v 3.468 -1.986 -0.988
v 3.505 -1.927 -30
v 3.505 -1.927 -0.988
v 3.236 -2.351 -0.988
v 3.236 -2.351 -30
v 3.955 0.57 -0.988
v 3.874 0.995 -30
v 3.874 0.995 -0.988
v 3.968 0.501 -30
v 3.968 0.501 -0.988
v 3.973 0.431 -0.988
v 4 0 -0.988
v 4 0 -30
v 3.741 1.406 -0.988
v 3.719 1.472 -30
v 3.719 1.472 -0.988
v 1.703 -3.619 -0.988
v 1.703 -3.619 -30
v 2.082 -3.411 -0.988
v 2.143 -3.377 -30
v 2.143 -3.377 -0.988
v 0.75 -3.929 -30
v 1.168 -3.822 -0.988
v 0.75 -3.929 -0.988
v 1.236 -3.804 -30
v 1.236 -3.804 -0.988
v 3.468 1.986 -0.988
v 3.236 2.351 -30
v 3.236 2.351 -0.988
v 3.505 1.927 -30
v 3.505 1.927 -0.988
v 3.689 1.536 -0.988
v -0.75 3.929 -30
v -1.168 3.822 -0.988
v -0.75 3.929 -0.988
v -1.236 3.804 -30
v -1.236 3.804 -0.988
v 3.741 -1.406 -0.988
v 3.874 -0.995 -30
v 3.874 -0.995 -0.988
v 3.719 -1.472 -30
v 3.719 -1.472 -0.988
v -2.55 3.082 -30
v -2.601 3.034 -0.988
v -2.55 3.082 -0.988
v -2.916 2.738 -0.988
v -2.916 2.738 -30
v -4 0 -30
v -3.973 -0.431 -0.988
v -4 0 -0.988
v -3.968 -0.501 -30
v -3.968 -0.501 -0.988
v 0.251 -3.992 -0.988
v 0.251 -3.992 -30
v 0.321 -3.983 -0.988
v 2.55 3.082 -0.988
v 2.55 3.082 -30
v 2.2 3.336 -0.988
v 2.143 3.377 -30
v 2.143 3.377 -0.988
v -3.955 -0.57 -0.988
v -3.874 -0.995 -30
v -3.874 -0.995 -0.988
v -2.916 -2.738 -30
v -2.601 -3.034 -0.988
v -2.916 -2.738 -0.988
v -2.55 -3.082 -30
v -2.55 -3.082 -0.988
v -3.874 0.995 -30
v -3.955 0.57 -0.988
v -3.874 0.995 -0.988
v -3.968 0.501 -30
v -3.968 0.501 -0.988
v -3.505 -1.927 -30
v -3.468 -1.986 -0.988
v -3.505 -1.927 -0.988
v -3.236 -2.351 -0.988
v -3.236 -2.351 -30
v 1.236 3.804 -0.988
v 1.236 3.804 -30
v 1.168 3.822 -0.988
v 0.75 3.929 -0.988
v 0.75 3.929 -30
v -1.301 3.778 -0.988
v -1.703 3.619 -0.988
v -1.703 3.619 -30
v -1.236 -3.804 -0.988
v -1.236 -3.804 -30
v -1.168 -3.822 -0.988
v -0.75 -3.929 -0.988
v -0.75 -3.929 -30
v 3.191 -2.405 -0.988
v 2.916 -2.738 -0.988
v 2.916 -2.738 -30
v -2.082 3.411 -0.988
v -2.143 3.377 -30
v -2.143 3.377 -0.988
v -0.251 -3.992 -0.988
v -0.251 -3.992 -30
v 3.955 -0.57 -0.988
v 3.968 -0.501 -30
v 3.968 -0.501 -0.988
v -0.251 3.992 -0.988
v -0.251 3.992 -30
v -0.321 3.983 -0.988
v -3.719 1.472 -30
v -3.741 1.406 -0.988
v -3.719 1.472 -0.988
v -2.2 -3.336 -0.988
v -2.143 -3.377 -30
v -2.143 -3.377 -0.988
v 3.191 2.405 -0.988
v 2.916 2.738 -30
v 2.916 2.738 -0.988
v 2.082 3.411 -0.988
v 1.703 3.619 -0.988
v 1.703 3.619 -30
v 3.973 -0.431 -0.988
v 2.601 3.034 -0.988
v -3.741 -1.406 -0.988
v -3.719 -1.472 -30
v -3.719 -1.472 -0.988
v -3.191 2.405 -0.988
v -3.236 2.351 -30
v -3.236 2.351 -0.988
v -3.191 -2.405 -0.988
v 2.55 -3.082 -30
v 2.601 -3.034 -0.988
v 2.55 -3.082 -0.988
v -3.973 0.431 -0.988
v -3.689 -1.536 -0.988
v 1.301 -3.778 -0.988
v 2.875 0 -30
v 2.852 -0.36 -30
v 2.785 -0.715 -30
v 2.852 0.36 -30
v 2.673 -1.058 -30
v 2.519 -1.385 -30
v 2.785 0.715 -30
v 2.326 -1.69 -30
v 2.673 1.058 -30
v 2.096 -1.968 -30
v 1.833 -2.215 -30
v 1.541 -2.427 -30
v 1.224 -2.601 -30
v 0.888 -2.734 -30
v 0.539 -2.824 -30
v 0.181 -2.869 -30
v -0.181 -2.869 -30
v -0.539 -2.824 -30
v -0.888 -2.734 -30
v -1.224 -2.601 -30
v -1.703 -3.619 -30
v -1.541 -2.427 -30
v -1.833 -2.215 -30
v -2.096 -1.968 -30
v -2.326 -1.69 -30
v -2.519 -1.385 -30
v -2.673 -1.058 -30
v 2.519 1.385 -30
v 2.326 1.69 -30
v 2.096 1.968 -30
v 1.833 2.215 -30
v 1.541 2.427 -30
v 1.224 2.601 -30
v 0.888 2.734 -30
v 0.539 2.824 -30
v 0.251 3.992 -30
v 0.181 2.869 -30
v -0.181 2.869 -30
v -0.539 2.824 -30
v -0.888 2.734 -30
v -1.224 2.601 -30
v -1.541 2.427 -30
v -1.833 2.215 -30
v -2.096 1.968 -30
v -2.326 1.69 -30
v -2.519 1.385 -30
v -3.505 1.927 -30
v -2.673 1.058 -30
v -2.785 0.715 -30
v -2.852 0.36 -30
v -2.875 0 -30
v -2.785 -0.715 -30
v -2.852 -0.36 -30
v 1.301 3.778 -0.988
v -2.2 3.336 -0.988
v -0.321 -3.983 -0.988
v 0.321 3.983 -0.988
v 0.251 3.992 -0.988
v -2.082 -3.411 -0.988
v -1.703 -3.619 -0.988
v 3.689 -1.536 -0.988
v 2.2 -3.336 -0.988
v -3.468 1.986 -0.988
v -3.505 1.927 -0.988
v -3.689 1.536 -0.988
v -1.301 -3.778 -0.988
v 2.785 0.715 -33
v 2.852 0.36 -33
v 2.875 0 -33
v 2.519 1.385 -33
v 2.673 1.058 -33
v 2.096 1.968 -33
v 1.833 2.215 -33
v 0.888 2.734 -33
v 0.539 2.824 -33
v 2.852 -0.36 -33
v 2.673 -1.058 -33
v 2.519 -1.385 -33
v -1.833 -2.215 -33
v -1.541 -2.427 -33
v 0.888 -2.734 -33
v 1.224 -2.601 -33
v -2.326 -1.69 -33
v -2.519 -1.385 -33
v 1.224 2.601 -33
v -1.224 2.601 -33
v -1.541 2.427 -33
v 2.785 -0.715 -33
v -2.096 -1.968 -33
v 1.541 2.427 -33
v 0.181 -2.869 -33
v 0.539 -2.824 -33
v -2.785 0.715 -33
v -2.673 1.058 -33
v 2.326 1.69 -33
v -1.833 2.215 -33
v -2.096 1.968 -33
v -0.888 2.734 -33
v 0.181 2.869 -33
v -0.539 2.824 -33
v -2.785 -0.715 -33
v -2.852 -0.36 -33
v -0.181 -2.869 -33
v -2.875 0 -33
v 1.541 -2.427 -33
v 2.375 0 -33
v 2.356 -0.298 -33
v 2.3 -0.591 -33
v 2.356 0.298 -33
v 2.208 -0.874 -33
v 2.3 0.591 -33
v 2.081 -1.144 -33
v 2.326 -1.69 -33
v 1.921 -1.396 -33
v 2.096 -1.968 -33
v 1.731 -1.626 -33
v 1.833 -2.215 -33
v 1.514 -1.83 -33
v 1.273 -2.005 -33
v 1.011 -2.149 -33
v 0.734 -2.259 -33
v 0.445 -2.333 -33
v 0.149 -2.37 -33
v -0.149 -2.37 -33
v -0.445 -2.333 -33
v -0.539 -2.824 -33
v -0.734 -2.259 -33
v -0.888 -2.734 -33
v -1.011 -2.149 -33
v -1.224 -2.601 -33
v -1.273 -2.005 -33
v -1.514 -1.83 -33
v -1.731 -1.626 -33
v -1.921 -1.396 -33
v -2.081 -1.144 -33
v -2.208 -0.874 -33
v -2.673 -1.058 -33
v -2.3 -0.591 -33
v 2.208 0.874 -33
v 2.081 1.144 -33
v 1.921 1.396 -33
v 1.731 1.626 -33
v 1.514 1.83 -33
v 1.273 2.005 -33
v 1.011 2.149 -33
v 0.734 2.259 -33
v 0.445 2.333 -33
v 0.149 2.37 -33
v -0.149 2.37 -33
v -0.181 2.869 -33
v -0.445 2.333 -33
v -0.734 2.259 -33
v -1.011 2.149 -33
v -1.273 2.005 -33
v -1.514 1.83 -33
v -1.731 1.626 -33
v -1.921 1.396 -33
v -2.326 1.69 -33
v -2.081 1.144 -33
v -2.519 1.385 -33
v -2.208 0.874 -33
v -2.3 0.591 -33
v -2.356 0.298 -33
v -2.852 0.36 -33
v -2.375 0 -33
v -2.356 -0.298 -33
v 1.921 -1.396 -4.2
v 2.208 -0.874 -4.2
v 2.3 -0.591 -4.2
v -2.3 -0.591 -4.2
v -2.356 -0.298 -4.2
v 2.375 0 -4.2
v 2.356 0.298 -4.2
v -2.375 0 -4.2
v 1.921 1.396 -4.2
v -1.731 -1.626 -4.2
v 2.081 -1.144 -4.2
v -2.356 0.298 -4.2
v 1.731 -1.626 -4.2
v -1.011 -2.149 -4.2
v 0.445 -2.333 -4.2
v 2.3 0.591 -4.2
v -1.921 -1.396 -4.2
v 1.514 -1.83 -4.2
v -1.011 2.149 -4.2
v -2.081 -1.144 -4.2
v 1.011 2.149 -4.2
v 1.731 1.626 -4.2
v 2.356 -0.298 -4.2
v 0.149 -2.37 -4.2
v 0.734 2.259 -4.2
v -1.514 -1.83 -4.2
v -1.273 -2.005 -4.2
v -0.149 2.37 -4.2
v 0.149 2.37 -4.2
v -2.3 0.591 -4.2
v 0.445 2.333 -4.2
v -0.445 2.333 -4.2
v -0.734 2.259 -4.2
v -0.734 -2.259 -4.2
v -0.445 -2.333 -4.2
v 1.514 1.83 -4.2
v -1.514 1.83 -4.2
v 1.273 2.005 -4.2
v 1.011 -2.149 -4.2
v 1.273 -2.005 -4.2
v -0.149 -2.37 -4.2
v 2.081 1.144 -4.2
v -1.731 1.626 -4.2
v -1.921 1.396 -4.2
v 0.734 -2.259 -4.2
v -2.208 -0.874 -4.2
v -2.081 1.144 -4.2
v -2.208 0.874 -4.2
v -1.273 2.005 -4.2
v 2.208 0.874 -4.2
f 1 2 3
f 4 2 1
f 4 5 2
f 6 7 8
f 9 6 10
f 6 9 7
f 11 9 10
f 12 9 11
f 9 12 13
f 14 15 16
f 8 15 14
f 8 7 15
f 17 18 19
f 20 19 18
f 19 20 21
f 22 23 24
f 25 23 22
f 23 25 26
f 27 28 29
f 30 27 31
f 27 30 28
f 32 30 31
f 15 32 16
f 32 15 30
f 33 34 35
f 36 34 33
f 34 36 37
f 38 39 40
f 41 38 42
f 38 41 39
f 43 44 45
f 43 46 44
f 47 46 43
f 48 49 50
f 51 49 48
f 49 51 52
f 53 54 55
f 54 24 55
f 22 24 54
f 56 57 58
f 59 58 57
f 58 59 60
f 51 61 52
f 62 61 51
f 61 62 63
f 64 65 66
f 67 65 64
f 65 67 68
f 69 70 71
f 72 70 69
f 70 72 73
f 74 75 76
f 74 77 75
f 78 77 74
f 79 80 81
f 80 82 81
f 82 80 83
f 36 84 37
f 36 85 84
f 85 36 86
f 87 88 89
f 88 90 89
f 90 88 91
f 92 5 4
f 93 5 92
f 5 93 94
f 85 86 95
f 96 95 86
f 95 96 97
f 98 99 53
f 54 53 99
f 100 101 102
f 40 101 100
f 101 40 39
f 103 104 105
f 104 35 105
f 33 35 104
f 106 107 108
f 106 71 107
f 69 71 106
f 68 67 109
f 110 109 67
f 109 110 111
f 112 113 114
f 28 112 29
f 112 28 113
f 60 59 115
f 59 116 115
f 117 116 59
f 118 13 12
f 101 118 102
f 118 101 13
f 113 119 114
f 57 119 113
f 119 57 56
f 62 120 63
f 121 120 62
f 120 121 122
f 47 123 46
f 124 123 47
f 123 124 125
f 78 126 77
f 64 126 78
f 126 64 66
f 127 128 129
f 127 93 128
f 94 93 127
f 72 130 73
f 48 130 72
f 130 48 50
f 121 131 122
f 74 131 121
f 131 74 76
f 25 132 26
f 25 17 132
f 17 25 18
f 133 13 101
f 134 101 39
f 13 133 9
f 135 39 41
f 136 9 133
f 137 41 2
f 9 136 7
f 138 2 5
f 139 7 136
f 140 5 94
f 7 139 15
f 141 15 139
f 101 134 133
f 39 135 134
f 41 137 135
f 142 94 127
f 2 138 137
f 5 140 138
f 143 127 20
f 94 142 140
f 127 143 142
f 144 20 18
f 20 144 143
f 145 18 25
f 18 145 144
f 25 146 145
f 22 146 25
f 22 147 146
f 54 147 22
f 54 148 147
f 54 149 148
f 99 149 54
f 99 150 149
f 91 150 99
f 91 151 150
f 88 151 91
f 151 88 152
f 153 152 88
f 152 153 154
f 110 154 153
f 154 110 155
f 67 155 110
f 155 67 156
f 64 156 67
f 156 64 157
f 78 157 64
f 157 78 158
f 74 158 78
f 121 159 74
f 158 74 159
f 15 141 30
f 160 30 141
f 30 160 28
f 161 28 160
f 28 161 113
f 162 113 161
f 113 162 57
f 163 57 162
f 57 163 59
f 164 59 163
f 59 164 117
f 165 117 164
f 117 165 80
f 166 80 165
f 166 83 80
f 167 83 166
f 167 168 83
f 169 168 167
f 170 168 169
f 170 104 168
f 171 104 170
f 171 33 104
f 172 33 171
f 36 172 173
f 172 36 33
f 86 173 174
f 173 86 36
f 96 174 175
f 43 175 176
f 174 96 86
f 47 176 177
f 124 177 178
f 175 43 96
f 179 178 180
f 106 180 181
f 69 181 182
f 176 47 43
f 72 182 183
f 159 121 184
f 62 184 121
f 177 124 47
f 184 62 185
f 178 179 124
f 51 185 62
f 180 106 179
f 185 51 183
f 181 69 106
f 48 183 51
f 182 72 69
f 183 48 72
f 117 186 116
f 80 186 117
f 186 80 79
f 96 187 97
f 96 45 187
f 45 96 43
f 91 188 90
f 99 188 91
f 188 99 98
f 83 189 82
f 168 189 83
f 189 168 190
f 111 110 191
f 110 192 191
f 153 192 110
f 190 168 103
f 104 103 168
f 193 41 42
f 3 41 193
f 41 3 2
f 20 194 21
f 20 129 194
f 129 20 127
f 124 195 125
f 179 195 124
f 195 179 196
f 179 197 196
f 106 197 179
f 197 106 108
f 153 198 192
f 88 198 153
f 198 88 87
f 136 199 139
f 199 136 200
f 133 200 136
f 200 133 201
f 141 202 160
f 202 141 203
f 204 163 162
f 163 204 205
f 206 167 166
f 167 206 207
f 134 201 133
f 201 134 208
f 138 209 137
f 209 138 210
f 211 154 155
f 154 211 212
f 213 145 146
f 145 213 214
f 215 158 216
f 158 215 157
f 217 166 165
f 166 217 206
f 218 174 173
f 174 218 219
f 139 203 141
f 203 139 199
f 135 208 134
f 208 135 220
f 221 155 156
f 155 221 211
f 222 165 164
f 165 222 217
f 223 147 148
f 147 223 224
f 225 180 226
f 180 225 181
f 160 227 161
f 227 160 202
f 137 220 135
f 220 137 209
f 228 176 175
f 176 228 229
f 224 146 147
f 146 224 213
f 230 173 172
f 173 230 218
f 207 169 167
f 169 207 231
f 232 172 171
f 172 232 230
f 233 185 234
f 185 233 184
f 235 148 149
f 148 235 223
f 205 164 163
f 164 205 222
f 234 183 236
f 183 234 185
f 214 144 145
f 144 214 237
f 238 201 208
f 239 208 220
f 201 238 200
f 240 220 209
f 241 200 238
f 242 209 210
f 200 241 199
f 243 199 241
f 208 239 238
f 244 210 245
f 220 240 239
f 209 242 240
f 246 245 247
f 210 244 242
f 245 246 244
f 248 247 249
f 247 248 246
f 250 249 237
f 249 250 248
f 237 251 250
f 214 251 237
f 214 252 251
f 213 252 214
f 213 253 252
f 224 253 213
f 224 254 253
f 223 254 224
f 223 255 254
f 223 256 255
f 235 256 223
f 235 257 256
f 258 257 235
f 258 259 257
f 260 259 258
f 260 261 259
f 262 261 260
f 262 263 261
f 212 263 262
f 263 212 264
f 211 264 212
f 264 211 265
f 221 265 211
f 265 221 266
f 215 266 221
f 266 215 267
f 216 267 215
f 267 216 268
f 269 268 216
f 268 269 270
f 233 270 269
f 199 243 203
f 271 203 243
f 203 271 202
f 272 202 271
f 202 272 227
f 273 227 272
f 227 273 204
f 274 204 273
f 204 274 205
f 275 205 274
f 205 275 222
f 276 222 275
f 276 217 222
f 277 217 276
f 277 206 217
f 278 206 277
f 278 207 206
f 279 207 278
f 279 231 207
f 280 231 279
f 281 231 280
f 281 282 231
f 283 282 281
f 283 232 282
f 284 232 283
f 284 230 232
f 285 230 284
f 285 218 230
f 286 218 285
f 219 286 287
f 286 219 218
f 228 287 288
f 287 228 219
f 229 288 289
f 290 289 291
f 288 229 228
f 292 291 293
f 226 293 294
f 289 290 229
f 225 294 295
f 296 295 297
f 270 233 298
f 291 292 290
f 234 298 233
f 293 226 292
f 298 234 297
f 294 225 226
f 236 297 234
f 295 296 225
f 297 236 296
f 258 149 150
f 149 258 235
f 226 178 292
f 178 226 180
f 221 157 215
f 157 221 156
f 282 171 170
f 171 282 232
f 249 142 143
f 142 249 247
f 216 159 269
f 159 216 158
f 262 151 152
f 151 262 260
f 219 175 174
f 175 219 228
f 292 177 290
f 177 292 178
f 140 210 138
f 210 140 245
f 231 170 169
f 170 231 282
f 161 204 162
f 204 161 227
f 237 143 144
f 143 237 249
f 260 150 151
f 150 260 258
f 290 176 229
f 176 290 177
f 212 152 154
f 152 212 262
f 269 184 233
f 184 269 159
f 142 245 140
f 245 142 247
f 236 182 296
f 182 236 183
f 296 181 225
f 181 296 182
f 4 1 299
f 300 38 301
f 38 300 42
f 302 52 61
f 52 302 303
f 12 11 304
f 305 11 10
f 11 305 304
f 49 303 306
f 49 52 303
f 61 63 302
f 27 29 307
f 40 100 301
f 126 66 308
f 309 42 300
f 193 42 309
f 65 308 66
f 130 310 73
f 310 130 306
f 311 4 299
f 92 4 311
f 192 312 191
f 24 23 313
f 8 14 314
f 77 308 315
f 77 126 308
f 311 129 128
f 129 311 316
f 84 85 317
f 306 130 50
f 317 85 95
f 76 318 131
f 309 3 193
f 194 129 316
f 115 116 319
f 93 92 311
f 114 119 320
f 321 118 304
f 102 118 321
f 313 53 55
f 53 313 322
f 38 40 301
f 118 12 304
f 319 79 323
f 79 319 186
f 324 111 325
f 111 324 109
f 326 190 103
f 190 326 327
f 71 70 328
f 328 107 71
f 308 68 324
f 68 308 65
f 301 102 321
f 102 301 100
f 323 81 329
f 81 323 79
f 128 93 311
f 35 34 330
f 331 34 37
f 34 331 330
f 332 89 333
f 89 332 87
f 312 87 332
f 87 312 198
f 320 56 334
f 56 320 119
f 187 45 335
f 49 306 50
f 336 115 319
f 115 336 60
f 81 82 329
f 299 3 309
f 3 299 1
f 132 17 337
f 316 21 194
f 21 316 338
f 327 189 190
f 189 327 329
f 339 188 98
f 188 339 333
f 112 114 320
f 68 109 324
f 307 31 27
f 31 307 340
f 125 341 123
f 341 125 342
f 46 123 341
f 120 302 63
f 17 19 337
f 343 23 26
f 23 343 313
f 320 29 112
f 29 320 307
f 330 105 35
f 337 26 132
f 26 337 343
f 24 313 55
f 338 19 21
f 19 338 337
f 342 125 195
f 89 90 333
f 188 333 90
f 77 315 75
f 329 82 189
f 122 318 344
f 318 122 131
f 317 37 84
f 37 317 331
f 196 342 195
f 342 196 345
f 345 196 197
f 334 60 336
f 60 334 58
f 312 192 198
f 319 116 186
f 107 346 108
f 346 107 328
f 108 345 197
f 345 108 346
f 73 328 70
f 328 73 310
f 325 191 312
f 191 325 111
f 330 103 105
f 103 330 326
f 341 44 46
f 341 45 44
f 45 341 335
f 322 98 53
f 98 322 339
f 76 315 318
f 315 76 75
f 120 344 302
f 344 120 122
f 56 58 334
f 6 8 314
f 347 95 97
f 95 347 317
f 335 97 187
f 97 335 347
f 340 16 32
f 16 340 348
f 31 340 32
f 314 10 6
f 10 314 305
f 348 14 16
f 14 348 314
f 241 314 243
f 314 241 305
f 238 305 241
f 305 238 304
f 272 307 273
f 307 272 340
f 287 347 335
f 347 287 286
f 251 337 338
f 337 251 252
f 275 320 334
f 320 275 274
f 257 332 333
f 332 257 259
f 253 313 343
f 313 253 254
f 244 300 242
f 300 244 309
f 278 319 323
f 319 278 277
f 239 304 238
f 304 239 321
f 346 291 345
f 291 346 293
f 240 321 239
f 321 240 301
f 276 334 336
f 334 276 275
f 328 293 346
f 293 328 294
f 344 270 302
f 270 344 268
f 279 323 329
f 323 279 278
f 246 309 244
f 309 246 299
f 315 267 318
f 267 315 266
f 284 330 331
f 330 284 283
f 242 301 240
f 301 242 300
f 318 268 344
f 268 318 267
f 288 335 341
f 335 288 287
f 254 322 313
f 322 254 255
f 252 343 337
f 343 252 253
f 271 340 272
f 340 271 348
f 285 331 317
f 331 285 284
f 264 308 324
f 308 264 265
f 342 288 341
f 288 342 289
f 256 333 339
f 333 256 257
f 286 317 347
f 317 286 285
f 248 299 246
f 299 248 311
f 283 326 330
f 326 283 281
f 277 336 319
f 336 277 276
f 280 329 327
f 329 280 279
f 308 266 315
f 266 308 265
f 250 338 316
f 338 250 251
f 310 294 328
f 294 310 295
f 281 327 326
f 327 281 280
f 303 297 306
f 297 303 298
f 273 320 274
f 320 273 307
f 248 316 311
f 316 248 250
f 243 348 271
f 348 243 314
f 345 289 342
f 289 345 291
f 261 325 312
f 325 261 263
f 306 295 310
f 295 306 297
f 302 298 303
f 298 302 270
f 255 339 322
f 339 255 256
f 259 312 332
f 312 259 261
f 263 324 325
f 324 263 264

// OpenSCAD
$fn = 50;

difference() {
	union() {
		translate(v = [0, 0, -30.0]) {
			cylinder(h = 33, r = 4.0);
		}
		#translate(v = [0, 0, -33.0]) {
			cylinder(h = 33, r = 2.875);
		}
	}
	union() {
		translate(v = [0, 0, 0]) {
			rotate(a = [0, 0, 0]) {
				difference() {
					union() {
						translate(v = [0, 0, -33.0]) {
							cylinder(h = 33, r = 2.25);
						}
						translate(v = [0, 0, -4.2]) {
							cylinder(h = 4.2, r1 = 2.375, r2 = 4.5);
						}
						translate(v = [0, 0, -33.0]) {
							cylinder(h = 33, r = 2.375);
						}
						translate(v = [0, 0, -33.0]) {
							cylinder(h = 33, r = 2.25);
						}
					}
					union();
				}
			}
		}
		#cylinder(h = 3, r = 5.0);
	}
}
